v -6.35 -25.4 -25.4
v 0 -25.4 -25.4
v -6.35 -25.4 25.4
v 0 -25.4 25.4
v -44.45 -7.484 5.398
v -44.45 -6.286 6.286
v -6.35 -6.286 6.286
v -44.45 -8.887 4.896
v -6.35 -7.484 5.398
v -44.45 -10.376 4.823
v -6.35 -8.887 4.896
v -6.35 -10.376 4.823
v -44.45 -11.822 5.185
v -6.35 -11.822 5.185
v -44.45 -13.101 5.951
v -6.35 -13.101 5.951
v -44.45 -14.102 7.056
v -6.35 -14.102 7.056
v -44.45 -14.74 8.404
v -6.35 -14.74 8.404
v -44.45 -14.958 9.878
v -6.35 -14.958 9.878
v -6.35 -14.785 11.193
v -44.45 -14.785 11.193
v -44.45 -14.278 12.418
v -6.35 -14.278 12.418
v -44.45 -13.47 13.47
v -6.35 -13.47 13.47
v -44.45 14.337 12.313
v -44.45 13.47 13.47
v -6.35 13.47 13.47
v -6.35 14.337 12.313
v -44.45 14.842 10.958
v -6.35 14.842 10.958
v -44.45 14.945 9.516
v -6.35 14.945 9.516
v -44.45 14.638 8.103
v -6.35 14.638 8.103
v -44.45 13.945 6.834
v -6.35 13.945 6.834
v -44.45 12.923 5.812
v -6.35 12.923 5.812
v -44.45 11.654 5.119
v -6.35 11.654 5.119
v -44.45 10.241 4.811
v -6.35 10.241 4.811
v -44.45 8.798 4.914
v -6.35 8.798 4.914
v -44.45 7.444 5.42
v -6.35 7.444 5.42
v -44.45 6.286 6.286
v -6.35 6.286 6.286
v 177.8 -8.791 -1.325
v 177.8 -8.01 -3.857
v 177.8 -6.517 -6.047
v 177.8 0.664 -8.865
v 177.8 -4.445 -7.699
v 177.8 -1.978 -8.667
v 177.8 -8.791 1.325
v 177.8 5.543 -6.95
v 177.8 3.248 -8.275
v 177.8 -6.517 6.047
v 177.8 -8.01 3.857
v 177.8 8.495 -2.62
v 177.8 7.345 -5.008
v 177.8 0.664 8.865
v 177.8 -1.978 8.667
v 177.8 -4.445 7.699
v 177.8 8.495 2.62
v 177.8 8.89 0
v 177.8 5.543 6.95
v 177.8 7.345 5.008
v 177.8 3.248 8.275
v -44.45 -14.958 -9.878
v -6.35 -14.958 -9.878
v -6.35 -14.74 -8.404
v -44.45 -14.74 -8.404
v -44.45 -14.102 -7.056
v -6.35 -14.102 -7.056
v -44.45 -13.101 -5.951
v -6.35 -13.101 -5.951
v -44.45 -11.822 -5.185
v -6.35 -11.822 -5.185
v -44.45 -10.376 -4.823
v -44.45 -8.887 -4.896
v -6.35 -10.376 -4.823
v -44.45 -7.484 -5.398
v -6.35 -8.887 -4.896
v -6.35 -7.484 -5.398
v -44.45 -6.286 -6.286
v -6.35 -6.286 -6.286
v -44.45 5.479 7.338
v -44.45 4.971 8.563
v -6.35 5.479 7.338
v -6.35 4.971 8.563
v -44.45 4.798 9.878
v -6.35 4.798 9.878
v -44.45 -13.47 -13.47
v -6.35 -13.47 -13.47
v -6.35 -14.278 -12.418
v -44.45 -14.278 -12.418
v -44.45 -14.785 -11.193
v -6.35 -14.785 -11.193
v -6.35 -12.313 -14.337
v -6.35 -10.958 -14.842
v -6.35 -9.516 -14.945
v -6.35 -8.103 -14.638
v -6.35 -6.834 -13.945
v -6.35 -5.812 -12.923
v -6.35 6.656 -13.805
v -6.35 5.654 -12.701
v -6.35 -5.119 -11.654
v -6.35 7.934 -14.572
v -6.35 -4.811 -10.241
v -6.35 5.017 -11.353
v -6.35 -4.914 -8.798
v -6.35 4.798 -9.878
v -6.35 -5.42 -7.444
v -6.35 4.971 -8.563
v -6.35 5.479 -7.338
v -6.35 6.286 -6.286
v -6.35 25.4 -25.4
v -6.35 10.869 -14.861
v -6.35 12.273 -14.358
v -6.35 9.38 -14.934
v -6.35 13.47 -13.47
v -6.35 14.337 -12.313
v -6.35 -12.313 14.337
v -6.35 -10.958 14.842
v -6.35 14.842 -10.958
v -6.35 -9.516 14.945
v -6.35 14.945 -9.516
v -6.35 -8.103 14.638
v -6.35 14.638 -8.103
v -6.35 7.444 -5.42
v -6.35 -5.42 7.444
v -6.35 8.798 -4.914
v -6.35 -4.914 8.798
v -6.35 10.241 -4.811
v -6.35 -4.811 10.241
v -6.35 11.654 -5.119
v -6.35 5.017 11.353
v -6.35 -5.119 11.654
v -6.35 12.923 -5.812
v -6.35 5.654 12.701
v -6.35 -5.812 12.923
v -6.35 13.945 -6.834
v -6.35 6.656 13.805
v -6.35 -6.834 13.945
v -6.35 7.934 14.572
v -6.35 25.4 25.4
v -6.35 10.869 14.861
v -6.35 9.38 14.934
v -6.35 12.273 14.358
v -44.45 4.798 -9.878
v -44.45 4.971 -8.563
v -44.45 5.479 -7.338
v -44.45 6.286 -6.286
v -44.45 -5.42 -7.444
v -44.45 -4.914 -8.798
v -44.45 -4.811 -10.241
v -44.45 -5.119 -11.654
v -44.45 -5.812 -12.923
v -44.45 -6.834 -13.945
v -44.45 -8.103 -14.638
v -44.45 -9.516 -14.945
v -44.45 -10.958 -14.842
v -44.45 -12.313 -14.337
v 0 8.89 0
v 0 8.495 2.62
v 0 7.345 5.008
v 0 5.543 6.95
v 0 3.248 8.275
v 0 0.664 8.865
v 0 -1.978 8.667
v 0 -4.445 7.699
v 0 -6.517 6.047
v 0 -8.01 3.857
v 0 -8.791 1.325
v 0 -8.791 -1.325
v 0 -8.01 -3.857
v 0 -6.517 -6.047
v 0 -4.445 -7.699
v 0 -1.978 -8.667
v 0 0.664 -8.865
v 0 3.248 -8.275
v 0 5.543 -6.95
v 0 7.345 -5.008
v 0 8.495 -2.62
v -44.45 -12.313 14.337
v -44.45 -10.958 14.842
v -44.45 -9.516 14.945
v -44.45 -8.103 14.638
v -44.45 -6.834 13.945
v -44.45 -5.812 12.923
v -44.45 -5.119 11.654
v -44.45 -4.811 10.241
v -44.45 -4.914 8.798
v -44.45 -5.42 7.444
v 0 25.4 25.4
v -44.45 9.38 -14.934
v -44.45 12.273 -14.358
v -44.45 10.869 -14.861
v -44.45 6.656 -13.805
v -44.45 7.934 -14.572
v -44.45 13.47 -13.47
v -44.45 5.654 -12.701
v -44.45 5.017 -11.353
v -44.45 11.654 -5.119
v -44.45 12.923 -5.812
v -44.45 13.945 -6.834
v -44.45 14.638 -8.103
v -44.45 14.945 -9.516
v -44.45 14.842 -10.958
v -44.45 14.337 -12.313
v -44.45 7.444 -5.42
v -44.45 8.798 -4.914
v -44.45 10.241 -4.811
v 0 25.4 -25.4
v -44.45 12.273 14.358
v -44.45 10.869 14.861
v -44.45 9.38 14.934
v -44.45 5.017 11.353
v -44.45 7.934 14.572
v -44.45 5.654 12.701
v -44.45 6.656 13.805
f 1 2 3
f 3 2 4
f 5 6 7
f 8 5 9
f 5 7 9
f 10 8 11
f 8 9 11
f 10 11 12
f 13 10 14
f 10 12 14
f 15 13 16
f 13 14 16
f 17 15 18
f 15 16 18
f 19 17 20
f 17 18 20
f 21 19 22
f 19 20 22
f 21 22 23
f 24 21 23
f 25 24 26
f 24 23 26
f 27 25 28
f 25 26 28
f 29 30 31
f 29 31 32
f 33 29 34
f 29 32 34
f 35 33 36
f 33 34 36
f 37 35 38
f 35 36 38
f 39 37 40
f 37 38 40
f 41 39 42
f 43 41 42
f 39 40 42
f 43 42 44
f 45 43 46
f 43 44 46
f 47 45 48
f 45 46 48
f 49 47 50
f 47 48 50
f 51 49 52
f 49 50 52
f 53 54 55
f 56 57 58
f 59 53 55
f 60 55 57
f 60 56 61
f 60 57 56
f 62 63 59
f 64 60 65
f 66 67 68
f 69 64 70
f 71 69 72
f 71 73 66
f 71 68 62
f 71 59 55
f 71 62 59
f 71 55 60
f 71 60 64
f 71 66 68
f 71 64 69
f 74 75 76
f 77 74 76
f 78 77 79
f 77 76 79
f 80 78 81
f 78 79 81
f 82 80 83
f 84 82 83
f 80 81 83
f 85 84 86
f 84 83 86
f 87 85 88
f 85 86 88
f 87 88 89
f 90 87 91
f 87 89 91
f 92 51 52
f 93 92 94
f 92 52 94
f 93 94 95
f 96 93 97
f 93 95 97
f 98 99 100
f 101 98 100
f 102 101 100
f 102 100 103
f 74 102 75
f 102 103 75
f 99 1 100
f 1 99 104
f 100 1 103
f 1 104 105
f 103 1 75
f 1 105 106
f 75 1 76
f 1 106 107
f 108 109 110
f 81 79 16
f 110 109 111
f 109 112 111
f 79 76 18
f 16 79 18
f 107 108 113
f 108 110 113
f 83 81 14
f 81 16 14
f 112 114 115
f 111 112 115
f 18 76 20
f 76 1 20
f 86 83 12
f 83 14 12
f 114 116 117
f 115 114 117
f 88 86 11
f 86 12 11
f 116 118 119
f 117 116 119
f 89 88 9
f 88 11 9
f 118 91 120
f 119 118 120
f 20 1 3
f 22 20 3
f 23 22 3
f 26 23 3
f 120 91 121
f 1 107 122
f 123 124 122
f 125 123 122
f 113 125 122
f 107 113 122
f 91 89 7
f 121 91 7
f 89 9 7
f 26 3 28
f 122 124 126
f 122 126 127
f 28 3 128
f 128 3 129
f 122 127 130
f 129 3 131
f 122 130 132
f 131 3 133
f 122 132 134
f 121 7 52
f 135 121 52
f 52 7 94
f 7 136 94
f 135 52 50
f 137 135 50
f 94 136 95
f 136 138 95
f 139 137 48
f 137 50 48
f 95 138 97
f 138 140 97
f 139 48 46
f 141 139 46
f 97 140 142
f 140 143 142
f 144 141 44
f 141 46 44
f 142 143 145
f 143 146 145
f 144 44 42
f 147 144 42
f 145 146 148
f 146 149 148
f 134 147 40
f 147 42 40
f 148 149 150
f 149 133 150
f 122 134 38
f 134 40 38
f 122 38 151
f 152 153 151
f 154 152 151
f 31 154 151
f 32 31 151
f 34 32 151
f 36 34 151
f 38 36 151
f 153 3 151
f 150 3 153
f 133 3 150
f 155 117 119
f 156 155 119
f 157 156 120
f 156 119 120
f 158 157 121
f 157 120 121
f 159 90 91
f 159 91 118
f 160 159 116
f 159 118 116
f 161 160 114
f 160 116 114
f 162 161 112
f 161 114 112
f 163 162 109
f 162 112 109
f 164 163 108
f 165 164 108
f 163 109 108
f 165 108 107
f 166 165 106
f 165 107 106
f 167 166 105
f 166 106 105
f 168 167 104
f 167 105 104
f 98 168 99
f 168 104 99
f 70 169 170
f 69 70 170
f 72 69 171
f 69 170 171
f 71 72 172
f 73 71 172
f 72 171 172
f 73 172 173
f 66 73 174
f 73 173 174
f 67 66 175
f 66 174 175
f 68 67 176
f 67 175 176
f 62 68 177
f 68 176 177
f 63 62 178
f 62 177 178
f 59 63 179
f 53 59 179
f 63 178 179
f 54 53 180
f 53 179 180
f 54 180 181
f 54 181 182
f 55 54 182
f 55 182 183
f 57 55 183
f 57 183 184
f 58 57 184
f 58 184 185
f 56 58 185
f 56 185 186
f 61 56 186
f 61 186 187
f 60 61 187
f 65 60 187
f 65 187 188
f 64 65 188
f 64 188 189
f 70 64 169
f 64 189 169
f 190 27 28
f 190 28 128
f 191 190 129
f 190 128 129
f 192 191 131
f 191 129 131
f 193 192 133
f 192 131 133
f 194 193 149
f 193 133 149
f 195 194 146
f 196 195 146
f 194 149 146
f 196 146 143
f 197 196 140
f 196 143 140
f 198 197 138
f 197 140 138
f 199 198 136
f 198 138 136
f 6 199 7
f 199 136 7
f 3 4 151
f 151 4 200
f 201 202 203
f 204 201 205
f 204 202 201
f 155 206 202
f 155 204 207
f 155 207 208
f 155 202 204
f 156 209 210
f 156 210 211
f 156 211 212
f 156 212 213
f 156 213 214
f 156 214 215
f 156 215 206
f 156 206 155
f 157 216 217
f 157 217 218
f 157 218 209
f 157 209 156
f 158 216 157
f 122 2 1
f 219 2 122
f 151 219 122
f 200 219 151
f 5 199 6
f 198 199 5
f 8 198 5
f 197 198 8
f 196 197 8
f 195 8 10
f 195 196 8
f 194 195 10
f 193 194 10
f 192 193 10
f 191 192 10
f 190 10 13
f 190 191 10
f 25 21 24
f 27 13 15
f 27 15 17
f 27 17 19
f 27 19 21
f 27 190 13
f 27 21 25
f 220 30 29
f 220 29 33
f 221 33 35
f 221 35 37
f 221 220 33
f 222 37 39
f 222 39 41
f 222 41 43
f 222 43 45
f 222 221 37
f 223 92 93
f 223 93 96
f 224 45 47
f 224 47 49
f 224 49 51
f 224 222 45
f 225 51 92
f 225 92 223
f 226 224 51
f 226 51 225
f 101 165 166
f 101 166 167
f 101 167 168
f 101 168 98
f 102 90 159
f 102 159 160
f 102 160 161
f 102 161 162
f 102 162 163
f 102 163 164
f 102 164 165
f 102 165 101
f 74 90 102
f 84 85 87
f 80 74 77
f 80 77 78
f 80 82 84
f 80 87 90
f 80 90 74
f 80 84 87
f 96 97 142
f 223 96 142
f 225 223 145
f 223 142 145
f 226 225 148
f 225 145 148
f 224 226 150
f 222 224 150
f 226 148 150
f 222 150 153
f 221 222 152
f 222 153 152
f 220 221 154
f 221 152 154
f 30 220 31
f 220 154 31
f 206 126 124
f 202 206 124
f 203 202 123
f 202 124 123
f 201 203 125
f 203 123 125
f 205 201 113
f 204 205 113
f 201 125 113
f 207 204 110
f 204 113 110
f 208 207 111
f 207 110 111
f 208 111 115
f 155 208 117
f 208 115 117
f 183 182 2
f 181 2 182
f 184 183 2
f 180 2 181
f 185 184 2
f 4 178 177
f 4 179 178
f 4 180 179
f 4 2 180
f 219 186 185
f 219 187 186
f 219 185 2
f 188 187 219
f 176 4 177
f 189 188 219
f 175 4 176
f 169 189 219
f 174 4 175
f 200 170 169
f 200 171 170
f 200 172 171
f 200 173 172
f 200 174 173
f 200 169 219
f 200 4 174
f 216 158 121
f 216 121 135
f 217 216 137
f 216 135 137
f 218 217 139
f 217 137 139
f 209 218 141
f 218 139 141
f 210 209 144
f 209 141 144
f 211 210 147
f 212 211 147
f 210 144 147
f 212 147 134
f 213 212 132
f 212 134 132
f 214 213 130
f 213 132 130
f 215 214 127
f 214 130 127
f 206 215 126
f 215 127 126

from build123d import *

# Parameters (mm, degrees)
F0_R     = 8.89
F1_DEPTH = 177.8
F2_W     = 50.8
F2_H     = 50.8
F3_DEPTH = 6.35
F5_DEPTH = 38.1


with BuildPart() as f1:
    # F0 (on Right) → F1 (new body)
    with BuildSketch(Plane.YZ):
        Circle(F0_R)
    extrude(amount=F1_DEPTH)

    # F2 (on Right) → F3 (join)
    with BuildSketch(Plane.YZ):
        Rectangle(F2_W, F2_H)
    extrude(amount=-F3_DEPTH)

    # F4 (on face) → F5 (join)
    with BuildSketch(Plane(origin=(-6.35, 0, 0), x_dir=(0, -1, 0), z_dir=(-1, 0, 0))):
        with BuildLine():
            ThreePointArc((6.286179, 6.286179), (11.822314, 5.184974), (14.958282, 9.878282))
            ThreePointArc((14.958282, 9.878282), (14.57159, 11.822314), (13.470384, 13.470384))
            Line((13.470384, 13.470384), (6.286179, 6.286179))
        make_face()
        with BuildLine():
            ThreePointArc((14.95827, -9.87827), (11.822302, -5.184962), (6.286168, -6.286168))
            Line((6.286168, -6.286168), (13.470373, -13.470373))
            ThreePointArc((13.470373, -13.470373), (14.571578, -11.822302), (14.95827, -9.87827))
        make_face()
        with BuildLine():
            Line((13.470373, -13.470373), (6.286168, -6.286168))
            ThreePointArc((6.286168, -6.286168), (6.286168, -13.470373), (13.470373, -13.470373))
        make_face()
        with BuildLine():
            ThreePointArc((-4.798282, -9.878282), (-5.184974, -7.93425), (-6.286179, -6.286179))
            Line((-6.286179, -6.286179), (-13.470384, -13.470384))
            ThreePointArc((-13.470384, -13.470384), (-7.93425, -14.57159), (-4.798282, -9.878282))
        make_face()
        with BuildLine():
            Line((-13.470384, -13.470384), (-6.286179, -6.286179))
            ThreePointArc((-6.286179, -6.286179), (-13.470384, -6.286179), (-13.470384, -13.470384))
        make_face()
        with BuildLine():
            ThreePointArc((-13.470396, 13.470396), (-13.470396, 6.286191), (-6.286191, 6.286191))
            Line((-6.286191, 6.286191), (-13.470396, 13.470396))
        make_face()
        with BuildLine():
            Line((-13.470396, 13.470396), (-6.286191, 6.286191))
            ThreePointArc((-6.286191, 6.286191), (-5.184985, 7.934262), (-4.798293, 9.878293))
            ThreePointArc((-4.798293, 9.878293), (-7.934262, 14.571601), (-13.470396, 13.470396))
        make_face()
        with BuildLine():
            Line((6.286179, 6.286179), (13.470384, 13.470384))
            ThreePointArc((13.470384, 13.470384), (6.286179, 13.470384), (6.286179, 6.286179))
        make_face()
    extrude(amount=F5_DEPTH)


solid = f1.part
